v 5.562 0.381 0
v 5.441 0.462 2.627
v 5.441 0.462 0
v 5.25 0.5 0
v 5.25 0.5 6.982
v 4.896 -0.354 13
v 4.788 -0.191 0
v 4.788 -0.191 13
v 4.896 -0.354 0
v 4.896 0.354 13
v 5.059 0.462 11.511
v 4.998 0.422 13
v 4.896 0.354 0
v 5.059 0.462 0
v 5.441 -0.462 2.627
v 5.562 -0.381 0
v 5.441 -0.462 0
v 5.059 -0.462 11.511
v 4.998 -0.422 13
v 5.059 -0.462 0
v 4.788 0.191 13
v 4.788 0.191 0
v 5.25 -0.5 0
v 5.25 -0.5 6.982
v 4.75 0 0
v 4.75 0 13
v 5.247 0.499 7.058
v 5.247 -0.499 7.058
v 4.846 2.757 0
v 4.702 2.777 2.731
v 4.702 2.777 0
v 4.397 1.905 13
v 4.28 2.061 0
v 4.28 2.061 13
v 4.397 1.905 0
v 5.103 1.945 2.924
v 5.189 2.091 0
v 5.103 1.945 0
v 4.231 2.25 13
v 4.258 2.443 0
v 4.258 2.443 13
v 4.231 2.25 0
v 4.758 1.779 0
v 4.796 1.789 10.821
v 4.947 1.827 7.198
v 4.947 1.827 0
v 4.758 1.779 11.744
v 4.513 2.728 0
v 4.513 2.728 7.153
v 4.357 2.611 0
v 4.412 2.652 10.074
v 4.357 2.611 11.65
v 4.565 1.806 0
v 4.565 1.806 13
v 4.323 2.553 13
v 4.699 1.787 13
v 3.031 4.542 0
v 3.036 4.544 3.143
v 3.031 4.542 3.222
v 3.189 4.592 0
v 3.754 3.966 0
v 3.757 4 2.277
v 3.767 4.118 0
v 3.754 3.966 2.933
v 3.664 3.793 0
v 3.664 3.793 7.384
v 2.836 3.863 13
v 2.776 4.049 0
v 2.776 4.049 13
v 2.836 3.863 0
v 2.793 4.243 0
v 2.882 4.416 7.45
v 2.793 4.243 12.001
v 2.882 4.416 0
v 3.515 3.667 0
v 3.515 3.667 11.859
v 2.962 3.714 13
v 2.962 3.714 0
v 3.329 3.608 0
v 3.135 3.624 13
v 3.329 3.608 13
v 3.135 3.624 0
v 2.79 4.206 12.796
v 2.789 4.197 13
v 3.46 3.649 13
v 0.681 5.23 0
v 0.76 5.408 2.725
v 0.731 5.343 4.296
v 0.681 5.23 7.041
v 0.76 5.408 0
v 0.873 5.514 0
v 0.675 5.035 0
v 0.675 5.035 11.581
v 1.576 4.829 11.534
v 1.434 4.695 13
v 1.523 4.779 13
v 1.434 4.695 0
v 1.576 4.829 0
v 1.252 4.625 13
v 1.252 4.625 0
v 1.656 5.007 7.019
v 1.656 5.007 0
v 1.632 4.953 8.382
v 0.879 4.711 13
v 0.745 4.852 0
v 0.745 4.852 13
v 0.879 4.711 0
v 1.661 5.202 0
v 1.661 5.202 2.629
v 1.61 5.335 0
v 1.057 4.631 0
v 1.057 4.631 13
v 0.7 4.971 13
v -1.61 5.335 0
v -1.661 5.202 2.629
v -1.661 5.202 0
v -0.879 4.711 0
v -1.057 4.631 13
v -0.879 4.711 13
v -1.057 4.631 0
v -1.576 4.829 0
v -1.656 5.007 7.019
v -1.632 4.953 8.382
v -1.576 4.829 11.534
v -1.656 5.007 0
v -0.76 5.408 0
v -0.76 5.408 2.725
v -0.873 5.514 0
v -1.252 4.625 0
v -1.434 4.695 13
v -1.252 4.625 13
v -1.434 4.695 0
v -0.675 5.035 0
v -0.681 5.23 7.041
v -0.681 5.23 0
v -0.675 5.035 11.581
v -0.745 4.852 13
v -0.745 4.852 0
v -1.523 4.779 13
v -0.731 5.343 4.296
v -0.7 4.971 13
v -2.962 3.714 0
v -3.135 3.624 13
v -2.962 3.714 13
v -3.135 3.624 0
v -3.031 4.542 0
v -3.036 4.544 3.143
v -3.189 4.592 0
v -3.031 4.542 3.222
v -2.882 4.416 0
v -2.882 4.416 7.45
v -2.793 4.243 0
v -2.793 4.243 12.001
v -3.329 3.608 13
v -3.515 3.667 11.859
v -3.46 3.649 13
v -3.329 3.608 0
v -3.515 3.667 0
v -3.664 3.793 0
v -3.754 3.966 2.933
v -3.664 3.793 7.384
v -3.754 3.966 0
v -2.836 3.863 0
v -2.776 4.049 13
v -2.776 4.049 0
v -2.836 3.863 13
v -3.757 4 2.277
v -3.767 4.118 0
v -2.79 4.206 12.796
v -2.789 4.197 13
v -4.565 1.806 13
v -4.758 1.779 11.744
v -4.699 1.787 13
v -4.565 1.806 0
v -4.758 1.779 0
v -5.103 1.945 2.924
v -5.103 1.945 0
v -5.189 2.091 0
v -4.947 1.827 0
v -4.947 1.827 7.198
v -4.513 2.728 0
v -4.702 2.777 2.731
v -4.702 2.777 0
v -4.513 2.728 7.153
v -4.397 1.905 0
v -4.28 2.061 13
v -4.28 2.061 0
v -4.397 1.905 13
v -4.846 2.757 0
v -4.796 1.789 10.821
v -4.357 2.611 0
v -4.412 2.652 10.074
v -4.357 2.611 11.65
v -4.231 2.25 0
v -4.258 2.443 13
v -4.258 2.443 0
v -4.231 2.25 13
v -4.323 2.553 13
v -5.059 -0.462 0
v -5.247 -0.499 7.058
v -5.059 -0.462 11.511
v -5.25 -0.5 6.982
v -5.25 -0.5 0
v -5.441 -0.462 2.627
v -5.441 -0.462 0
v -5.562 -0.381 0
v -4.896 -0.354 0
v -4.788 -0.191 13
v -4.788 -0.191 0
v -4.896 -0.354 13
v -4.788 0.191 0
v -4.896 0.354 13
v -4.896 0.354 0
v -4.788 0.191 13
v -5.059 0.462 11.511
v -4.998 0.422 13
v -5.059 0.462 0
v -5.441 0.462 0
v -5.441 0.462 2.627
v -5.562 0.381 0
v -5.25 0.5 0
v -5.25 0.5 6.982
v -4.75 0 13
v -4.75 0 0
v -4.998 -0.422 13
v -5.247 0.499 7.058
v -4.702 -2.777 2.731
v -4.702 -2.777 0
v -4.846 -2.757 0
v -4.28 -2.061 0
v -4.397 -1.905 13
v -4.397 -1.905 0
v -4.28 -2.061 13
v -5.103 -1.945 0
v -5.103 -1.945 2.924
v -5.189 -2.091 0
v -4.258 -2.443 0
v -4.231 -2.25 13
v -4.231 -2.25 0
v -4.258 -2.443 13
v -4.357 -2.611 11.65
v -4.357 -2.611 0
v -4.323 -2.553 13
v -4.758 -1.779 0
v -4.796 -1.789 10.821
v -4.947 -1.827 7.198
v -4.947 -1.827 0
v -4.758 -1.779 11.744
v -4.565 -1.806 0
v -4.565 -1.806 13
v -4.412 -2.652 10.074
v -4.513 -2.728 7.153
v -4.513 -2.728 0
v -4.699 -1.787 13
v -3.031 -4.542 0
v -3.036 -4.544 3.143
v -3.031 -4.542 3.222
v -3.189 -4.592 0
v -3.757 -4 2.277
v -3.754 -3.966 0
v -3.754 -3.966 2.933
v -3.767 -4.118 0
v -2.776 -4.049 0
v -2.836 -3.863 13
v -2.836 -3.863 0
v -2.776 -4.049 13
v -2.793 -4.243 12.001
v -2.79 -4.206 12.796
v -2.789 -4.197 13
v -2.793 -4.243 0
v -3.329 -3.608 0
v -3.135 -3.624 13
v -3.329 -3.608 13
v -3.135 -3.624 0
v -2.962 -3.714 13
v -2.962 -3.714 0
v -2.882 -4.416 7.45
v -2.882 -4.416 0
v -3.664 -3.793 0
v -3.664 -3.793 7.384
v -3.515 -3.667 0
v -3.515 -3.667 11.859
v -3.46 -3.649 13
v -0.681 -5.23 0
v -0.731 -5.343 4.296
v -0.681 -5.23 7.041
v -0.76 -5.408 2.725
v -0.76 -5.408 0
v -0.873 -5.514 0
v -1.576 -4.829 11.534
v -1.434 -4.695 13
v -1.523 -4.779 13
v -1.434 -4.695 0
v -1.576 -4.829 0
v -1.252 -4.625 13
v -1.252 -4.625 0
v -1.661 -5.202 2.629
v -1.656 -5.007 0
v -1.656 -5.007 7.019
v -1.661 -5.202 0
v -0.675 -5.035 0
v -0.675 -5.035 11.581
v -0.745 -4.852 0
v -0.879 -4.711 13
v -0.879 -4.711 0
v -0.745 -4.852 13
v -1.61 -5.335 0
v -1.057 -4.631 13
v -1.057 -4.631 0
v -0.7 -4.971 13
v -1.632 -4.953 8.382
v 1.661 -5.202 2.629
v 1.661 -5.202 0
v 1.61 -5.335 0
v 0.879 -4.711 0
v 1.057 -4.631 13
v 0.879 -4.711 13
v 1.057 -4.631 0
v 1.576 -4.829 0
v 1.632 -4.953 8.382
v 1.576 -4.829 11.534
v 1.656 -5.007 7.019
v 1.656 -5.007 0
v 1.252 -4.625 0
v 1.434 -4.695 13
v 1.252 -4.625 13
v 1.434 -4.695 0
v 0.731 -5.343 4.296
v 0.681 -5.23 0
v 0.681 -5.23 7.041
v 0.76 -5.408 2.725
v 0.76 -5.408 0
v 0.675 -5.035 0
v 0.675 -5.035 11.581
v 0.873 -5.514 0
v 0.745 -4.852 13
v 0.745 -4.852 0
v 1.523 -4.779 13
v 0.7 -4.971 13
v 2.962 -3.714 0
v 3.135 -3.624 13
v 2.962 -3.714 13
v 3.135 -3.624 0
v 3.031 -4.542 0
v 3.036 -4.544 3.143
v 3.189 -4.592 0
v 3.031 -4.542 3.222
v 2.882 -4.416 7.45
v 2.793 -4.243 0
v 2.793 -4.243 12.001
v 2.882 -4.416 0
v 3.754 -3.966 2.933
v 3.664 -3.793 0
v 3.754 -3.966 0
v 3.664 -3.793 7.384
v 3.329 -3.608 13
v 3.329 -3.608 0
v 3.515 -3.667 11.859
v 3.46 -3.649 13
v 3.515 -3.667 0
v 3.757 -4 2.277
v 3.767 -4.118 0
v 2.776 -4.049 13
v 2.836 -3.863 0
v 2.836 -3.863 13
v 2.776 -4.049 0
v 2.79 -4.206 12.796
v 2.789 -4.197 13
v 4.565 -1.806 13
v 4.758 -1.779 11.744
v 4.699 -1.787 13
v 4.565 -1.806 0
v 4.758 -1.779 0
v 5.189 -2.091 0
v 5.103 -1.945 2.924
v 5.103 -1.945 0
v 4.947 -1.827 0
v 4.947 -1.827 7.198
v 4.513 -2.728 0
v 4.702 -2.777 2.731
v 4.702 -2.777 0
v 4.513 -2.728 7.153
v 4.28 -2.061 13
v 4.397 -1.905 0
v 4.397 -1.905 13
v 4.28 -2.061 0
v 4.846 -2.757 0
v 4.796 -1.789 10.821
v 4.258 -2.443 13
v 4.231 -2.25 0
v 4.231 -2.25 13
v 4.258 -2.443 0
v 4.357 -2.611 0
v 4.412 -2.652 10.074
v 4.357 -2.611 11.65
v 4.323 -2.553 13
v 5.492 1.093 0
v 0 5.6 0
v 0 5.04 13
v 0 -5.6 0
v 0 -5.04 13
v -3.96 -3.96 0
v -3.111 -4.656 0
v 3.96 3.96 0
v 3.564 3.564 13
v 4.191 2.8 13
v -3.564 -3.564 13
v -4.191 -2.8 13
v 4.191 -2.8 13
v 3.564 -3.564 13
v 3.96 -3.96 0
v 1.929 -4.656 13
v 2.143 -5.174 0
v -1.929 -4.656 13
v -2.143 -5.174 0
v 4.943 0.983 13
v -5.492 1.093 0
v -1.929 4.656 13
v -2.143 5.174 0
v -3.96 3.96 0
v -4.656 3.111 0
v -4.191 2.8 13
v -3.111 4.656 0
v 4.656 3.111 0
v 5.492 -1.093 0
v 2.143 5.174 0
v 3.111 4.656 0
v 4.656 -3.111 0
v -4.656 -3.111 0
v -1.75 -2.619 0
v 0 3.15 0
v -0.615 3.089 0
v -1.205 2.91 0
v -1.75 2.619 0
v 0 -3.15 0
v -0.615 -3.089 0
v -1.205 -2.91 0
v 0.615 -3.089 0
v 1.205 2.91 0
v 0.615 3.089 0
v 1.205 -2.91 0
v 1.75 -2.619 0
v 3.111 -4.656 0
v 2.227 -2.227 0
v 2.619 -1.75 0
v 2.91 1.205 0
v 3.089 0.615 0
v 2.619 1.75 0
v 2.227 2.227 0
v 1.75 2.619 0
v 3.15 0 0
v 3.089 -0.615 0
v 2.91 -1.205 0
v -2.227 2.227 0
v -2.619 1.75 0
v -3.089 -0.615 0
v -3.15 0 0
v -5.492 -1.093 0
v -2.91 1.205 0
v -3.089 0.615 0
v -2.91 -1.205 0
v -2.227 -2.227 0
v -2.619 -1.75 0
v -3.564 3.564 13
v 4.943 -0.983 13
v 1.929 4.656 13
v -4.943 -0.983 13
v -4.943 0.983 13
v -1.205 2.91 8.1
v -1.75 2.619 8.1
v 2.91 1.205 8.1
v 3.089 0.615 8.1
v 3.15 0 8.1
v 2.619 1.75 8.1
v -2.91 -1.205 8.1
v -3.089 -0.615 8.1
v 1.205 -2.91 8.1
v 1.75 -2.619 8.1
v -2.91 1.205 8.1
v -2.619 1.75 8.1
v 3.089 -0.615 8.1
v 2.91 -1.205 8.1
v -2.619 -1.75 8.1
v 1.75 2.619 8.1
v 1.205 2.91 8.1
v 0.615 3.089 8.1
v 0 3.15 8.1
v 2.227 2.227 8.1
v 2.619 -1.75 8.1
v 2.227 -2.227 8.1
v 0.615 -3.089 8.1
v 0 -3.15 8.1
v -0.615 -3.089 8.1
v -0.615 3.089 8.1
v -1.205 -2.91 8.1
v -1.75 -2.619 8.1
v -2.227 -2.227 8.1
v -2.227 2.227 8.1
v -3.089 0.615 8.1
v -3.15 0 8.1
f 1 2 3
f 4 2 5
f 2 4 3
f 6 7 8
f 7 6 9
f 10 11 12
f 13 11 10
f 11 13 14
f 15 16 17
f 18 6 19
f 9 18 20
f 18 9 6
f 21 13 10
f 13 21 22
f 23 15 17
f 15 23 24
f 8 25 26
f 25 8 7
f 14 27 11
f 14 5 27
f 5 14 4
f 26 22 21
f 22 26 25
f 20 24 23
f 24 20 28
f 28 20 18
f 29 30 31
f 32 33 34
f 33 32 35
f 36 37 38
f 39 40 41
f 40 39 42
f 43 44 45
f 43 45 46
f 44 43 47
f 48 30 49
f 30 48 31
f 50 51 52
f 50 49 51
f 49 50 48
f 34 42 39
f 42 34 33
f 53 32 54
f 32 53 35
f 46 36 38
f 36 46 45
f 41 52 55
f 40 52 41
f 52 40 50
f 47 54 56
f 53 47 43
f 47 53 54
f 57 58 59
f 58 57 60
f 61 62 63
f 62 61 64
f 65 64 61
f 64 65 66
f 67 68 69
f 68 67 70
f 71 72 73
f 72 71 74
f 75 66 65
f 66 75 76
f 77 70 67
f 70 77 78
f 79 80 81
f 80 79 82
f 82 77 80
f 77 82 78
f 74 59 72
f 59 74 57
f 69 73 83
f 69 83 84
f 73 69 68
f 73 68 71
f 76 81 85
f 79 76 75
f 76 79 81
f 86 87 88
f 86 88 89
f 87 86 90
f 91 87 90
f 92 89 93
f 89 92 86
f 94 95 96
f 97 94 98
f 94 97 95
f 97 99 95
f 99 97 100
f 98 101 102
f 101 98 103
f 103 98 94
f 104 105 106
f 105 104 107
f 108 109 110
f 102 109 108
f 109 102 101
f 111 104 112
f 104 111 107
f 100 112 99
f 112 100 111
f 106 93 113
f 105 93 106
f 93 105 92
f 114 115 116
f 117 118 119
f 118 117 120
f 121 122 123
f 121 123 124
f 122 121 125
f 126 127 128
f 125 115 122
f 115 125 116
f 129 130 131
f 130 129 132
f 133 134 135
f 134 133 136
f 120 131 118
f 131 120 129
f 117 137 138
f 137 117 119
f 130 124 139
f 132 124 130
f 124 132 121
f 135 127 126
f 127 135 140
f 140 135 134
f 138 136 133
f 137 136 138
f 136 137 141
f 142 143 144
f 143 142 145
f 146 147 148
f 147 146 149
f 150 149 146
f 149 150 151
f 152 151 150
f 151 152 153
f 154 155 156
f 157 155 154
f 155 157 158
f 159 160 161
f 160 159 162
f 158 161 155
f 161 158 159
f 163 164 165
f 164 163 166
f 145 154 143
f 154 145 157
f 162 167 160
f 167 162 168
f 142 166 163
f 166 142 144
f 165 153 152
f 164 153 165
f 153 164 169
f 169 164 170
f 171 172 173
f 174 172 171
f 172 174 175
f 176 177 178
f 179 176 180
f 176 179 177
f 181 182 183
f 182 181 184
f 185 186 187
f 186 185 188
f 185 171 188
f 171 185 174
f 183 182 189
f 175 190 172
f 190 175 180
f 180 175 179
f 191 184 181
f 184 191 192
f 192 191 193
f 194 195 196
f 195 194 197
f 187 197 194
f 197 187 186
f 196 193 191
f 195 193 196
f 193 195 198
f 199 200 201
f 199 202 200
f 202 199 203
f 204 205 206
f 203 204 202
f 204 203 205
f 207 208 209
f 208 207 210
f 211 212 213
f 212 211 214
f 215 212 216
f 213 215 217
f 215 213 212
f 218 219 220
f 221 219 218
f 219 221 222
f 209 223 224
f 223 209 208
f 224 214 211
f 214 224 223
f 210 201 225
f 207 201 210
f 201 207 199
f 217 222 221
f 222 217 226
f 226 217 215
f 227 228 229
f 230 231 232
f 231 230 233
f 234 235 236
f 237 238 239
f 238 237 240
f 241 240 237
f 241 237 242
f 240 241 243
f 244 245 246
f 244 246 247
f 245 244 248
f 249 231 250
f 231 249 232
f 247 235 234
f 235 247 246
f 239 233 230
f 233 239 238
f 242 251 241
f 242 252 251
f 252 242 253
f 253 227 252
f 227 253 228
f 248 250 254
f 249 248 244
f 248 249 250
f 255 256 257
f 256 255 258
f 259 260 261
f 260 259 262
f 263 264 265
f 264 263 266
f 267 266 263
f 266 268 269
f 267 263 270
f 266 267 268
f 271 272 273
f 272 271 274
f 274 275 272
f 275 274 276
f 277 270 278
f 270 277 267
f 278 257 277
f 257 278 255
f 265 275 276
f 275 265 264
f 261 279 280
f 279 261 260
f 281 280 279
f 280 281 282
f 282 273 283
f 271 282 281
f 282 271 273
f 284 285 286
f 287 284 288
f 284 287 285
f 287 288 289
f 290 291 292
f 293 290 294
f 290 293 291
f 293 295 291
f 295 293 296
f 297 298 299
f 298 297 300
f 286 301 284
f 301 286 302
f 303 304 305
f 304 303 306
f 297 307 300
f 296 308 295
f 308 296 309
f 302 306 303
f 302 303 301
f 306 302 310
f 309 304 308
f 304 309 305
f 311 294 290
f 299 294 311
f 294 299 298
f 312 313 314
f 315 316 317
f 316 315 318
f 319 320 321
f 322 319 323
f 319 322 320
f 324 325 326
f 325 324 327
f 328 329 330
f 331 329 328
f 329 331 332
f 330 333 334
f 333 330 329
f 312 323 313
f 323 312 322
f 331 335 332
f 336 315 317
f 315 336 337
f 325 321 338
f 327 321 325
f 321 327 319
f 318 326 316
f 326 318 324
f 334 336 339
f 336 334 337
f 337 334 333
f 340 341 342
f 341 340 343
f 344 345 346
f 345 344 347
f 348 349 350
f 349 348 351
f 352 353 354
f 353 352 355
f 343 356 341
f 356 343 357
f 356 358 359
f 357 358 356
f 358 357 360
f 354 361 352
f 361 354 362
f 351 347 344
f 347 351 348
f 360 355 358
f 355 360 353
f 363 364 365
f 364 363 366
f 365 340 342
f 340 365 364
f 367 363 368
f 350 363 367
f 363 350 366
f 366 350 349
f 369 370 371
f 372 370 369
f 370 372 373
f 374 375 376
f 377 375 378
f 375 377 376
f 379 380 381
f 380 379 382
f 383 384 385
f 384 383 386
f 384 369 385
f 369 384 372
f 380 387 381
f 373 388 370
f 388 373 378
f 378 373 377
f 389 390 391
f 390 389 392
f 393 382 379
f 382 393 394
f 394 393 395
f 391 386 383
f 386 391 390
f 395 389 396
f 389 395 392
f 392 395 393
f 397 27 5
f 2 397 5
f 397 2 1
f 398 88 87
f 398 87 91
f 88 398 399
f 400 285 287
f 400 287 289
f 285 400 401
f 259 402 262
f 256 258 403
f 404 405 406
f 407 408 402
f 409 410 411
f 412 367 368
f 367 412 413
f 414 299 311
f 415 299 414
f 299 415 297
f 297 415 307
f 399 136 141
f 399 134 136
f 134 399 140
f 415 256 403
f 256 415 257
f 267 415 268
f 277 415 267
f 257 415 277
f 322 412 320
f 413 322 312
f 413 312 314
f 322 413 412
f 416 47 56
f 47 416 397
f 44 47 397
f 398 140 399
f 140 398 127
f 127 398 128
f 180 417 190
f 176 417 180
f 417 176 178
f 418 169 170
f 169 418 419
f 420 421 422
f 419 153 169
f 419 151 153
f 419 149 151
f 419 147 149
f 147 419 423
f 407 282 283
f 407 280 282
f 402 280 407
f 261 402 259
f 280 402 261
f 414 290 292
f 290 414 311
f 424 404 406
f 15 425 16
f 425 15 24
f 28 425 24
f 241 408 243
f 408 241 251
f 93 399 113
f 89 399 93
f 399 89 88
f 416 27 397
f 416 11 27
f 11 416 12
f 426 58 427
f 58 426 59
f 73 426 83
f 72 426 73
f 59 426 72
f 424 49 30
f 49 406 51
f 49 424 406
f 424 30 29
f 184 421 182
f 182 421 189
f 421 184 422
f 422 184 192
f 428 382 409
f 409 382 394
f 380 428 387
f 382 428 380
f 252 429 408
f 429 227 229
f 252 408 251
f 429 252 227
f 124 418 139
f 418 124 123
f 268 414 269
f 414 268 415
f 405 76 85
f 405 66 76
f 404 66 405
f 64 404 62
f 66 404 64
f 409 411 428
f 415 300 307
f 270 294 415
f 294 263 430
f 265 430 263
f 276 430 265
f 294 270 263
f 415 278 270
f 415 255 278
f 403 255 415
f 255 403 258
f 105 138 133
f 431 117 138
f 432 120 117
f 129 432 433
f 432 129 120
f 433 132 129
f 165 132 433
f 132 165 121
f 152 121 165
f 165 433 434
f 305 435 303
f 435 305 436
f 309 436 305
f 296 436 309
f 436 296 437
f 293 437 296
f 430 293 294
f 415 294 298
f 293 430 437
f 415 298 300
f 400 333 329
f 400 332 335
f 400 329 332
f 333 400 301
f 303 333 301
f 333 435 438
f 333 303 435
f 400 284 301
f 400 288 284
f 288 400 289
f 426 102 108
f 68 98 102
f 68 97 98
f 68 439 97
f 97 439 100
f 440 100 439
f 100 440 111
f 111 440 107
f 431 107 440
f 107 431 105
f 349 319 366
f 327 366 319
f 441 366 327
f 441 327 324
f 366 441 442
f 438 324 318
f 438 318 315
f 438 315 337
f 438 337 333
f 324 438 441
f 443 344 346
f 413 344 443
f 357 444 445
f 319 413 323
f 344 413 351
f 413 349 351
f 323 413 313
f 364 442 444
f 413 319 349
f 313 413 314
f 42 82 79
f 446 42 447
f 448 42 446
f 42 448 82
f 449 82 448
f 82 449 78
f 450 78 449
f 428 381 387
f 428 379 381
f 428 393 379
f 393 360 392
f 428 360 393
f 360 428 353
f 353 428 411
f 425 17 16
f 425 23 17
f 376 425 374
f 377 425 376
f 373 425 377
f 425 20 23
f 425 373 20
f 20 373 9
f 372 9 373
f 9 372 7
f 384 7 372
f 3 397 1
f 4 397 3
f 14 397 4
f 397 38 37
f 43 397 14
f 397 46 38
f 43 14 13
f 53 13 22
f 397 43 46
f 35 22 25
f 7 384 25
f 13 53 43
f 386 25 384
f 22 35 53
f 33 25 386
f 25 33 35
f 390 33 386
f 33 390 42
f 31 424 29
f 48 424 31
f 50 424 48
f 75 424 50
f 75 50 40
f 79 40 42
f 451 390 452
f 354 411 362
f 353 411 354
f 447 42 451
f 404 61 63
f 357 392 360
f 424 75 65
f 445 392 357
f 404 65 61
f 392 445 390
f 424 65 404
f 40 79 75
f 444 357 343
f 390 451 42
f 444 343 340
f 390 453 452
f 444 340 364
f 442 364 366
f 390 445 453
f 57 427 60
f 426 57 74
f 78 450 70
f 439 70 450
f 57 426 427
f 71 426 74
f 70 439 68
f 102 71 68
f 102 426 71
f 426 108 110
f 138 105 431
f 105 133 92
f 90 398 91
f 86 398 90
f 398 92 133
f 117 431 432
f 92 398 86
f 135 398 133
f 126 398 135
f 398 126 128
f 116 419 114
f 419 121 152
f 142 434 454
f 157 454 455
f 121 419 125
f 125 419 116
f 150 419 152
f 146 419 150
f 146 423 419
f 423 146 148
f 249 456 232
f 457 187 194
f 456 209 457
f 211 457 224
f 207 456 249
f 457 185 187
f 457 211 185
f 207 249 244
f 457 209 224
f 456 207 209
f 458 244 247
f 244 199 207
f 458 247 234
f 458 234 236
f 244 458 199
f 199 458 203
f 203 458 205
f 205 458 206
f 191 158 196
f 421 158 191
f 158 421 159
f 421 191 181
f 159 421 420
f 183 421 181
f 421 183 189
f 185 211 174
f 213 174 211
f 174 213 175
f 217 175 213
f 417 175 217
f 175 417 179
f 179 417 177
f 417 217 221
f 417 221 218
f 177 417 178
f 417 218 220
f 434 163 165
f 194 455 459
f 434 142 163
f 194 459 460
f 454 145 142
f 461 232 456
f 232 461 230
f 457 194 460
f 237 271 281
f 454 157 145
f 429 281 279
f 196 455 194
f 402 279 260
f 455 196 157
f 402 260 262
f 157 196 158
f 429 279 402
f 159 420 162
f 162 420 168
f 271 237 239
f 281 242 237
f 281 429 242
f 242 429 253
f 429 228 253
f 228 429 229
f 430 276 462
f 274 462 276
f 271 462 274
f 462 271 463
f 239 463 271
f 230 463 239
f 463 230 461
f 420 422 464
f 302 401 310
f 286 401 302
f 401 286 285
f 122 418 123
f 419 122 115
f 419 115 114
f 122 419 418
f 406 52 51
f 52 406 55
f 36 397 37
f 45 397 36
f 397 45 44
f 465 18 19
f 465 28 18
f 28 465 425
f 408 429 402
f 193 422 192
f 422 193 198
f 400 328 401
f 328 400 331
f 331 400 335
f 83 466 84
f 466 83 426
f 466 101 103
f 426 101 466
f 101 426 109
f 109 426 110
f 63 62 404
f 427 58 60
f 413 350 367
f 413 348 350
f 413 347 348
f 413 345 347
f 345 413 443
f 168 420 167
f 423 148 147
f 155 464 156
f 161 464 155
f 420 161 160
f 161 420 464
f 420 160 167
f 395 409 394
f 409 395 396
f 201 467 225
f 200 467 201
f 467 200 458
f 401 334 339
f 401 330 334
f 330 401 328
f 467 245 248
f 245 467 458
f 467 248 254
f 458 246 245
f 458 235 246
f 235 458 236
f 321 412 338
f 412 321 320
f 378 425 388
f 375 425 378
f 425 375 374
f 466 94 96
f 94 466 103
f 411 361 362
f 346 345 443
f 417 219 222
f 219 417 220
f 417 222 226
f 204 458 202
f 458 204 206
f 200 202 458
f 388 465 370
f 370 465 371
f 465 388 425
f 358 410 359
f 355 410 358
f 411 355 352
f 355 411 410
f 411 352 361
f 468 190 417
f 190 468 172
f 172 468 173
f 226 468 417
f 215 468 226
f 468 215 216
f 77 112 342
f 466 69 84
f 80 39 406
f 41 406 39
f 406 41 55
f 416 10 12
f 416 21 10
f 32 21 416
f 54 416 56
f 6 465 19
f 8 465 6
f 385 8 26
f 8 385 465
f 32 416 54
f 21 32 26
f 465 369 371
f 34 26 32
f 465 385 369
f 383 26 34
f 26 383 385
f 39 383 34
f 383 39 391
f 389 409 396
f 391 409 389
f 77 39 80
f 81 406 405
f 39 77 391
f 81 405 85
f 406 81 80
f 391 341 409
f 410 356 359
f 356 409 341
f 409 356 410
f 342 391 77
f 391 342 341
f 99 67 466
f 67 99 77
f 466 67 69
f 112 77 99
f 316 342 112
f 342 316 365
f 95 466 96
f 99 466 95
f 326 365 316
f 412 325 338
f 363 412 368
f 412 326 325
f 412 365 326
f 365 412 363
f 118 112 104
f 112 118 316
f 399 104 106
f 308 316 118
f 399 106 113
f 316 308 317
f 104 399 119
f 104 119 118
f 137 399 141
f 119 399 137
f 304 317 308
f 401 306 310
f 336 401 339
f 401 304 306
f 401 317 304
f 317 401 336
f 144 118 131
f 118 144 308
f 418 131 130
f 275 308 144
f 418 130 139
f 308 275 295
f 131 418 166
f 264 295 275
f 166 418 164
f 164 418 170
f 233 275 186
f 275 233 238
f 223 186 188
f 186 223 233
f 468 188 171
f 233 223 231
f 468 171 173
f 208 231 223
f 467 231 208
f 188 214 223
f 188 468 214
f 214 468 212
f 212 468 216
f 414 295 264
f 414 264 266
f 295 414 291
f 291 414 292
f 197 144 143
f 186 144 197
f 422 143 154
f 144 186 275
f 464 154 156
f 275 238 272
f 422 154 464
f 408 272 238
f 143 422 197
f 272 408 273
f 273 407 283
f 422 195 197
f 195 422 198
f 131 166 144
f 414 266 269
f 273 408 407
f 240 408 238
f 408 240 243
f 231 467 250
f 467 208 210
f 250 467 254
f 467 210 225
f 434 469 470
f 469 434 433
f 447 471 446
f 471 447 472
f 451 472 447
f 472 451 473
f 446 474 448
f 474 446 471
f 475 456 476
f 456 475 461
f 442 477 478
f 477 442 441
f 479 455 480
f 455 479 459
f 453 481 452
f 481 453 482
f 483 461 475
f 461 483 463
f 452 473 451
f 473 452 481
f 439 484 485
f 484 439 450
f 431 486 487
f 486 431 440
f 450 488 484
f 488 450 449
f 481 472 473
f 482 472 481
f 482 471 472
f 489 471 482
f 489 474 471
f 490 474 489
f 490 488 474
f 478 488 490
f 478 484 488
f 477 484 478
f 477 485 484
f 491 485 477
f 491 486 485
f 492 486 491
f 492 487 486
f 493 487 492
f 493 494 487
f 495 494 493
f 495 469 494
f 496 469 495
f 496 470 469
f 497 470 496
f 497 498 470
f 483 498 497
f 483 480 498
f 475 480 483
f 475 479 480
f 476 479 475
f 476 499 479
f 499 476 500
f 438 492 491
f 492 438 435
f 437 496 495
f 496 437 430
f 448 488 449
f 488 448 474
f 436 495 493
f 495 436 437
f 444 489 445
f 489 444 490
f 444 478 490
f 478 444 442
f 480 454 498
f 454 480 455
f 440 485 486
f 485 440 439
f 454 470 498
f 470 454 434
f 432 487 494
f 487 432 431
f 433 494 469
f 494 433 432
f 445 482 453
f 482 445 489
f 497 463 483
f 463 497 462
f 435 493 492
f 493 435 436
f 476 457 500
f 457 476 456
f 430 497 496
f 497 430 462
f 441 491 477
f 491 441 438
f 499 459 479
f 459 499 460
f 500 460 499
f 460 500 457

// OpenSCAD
// ACCESS KNOB — Shruthi XT Hybrid Monosynth Knob
// Generated via CLI for Studio Knobs
module access_knob_shruthi_xt() {
  outer_d = 11.2;
  height = 13;
  taper = 0.9;
  bore_d = 6;
  slot_h = 8;
  tex_depth = 0.7;
  tex_scale = 1;
  tex_count = 14;

  difference() {
    cylinder(h=height, d1=outer_d, d2=outer_d*taper, $fn=32);
    translate([0,0,-0.1]) cylinder(h=slot_h+0.2, d=bore_d + 0.3, $fn=32);
    for(i=[0:tex_count-1]) {
      rotate([0,0,i*(360/tex_count)])
        translate([outer_d/2-tex_depth/2, 0, height/2])
          cylinder(h=height*1.1, d=tex_scale, center=true, $fn=16);
    }
  }
}
access_knob_shruthi_xt();
